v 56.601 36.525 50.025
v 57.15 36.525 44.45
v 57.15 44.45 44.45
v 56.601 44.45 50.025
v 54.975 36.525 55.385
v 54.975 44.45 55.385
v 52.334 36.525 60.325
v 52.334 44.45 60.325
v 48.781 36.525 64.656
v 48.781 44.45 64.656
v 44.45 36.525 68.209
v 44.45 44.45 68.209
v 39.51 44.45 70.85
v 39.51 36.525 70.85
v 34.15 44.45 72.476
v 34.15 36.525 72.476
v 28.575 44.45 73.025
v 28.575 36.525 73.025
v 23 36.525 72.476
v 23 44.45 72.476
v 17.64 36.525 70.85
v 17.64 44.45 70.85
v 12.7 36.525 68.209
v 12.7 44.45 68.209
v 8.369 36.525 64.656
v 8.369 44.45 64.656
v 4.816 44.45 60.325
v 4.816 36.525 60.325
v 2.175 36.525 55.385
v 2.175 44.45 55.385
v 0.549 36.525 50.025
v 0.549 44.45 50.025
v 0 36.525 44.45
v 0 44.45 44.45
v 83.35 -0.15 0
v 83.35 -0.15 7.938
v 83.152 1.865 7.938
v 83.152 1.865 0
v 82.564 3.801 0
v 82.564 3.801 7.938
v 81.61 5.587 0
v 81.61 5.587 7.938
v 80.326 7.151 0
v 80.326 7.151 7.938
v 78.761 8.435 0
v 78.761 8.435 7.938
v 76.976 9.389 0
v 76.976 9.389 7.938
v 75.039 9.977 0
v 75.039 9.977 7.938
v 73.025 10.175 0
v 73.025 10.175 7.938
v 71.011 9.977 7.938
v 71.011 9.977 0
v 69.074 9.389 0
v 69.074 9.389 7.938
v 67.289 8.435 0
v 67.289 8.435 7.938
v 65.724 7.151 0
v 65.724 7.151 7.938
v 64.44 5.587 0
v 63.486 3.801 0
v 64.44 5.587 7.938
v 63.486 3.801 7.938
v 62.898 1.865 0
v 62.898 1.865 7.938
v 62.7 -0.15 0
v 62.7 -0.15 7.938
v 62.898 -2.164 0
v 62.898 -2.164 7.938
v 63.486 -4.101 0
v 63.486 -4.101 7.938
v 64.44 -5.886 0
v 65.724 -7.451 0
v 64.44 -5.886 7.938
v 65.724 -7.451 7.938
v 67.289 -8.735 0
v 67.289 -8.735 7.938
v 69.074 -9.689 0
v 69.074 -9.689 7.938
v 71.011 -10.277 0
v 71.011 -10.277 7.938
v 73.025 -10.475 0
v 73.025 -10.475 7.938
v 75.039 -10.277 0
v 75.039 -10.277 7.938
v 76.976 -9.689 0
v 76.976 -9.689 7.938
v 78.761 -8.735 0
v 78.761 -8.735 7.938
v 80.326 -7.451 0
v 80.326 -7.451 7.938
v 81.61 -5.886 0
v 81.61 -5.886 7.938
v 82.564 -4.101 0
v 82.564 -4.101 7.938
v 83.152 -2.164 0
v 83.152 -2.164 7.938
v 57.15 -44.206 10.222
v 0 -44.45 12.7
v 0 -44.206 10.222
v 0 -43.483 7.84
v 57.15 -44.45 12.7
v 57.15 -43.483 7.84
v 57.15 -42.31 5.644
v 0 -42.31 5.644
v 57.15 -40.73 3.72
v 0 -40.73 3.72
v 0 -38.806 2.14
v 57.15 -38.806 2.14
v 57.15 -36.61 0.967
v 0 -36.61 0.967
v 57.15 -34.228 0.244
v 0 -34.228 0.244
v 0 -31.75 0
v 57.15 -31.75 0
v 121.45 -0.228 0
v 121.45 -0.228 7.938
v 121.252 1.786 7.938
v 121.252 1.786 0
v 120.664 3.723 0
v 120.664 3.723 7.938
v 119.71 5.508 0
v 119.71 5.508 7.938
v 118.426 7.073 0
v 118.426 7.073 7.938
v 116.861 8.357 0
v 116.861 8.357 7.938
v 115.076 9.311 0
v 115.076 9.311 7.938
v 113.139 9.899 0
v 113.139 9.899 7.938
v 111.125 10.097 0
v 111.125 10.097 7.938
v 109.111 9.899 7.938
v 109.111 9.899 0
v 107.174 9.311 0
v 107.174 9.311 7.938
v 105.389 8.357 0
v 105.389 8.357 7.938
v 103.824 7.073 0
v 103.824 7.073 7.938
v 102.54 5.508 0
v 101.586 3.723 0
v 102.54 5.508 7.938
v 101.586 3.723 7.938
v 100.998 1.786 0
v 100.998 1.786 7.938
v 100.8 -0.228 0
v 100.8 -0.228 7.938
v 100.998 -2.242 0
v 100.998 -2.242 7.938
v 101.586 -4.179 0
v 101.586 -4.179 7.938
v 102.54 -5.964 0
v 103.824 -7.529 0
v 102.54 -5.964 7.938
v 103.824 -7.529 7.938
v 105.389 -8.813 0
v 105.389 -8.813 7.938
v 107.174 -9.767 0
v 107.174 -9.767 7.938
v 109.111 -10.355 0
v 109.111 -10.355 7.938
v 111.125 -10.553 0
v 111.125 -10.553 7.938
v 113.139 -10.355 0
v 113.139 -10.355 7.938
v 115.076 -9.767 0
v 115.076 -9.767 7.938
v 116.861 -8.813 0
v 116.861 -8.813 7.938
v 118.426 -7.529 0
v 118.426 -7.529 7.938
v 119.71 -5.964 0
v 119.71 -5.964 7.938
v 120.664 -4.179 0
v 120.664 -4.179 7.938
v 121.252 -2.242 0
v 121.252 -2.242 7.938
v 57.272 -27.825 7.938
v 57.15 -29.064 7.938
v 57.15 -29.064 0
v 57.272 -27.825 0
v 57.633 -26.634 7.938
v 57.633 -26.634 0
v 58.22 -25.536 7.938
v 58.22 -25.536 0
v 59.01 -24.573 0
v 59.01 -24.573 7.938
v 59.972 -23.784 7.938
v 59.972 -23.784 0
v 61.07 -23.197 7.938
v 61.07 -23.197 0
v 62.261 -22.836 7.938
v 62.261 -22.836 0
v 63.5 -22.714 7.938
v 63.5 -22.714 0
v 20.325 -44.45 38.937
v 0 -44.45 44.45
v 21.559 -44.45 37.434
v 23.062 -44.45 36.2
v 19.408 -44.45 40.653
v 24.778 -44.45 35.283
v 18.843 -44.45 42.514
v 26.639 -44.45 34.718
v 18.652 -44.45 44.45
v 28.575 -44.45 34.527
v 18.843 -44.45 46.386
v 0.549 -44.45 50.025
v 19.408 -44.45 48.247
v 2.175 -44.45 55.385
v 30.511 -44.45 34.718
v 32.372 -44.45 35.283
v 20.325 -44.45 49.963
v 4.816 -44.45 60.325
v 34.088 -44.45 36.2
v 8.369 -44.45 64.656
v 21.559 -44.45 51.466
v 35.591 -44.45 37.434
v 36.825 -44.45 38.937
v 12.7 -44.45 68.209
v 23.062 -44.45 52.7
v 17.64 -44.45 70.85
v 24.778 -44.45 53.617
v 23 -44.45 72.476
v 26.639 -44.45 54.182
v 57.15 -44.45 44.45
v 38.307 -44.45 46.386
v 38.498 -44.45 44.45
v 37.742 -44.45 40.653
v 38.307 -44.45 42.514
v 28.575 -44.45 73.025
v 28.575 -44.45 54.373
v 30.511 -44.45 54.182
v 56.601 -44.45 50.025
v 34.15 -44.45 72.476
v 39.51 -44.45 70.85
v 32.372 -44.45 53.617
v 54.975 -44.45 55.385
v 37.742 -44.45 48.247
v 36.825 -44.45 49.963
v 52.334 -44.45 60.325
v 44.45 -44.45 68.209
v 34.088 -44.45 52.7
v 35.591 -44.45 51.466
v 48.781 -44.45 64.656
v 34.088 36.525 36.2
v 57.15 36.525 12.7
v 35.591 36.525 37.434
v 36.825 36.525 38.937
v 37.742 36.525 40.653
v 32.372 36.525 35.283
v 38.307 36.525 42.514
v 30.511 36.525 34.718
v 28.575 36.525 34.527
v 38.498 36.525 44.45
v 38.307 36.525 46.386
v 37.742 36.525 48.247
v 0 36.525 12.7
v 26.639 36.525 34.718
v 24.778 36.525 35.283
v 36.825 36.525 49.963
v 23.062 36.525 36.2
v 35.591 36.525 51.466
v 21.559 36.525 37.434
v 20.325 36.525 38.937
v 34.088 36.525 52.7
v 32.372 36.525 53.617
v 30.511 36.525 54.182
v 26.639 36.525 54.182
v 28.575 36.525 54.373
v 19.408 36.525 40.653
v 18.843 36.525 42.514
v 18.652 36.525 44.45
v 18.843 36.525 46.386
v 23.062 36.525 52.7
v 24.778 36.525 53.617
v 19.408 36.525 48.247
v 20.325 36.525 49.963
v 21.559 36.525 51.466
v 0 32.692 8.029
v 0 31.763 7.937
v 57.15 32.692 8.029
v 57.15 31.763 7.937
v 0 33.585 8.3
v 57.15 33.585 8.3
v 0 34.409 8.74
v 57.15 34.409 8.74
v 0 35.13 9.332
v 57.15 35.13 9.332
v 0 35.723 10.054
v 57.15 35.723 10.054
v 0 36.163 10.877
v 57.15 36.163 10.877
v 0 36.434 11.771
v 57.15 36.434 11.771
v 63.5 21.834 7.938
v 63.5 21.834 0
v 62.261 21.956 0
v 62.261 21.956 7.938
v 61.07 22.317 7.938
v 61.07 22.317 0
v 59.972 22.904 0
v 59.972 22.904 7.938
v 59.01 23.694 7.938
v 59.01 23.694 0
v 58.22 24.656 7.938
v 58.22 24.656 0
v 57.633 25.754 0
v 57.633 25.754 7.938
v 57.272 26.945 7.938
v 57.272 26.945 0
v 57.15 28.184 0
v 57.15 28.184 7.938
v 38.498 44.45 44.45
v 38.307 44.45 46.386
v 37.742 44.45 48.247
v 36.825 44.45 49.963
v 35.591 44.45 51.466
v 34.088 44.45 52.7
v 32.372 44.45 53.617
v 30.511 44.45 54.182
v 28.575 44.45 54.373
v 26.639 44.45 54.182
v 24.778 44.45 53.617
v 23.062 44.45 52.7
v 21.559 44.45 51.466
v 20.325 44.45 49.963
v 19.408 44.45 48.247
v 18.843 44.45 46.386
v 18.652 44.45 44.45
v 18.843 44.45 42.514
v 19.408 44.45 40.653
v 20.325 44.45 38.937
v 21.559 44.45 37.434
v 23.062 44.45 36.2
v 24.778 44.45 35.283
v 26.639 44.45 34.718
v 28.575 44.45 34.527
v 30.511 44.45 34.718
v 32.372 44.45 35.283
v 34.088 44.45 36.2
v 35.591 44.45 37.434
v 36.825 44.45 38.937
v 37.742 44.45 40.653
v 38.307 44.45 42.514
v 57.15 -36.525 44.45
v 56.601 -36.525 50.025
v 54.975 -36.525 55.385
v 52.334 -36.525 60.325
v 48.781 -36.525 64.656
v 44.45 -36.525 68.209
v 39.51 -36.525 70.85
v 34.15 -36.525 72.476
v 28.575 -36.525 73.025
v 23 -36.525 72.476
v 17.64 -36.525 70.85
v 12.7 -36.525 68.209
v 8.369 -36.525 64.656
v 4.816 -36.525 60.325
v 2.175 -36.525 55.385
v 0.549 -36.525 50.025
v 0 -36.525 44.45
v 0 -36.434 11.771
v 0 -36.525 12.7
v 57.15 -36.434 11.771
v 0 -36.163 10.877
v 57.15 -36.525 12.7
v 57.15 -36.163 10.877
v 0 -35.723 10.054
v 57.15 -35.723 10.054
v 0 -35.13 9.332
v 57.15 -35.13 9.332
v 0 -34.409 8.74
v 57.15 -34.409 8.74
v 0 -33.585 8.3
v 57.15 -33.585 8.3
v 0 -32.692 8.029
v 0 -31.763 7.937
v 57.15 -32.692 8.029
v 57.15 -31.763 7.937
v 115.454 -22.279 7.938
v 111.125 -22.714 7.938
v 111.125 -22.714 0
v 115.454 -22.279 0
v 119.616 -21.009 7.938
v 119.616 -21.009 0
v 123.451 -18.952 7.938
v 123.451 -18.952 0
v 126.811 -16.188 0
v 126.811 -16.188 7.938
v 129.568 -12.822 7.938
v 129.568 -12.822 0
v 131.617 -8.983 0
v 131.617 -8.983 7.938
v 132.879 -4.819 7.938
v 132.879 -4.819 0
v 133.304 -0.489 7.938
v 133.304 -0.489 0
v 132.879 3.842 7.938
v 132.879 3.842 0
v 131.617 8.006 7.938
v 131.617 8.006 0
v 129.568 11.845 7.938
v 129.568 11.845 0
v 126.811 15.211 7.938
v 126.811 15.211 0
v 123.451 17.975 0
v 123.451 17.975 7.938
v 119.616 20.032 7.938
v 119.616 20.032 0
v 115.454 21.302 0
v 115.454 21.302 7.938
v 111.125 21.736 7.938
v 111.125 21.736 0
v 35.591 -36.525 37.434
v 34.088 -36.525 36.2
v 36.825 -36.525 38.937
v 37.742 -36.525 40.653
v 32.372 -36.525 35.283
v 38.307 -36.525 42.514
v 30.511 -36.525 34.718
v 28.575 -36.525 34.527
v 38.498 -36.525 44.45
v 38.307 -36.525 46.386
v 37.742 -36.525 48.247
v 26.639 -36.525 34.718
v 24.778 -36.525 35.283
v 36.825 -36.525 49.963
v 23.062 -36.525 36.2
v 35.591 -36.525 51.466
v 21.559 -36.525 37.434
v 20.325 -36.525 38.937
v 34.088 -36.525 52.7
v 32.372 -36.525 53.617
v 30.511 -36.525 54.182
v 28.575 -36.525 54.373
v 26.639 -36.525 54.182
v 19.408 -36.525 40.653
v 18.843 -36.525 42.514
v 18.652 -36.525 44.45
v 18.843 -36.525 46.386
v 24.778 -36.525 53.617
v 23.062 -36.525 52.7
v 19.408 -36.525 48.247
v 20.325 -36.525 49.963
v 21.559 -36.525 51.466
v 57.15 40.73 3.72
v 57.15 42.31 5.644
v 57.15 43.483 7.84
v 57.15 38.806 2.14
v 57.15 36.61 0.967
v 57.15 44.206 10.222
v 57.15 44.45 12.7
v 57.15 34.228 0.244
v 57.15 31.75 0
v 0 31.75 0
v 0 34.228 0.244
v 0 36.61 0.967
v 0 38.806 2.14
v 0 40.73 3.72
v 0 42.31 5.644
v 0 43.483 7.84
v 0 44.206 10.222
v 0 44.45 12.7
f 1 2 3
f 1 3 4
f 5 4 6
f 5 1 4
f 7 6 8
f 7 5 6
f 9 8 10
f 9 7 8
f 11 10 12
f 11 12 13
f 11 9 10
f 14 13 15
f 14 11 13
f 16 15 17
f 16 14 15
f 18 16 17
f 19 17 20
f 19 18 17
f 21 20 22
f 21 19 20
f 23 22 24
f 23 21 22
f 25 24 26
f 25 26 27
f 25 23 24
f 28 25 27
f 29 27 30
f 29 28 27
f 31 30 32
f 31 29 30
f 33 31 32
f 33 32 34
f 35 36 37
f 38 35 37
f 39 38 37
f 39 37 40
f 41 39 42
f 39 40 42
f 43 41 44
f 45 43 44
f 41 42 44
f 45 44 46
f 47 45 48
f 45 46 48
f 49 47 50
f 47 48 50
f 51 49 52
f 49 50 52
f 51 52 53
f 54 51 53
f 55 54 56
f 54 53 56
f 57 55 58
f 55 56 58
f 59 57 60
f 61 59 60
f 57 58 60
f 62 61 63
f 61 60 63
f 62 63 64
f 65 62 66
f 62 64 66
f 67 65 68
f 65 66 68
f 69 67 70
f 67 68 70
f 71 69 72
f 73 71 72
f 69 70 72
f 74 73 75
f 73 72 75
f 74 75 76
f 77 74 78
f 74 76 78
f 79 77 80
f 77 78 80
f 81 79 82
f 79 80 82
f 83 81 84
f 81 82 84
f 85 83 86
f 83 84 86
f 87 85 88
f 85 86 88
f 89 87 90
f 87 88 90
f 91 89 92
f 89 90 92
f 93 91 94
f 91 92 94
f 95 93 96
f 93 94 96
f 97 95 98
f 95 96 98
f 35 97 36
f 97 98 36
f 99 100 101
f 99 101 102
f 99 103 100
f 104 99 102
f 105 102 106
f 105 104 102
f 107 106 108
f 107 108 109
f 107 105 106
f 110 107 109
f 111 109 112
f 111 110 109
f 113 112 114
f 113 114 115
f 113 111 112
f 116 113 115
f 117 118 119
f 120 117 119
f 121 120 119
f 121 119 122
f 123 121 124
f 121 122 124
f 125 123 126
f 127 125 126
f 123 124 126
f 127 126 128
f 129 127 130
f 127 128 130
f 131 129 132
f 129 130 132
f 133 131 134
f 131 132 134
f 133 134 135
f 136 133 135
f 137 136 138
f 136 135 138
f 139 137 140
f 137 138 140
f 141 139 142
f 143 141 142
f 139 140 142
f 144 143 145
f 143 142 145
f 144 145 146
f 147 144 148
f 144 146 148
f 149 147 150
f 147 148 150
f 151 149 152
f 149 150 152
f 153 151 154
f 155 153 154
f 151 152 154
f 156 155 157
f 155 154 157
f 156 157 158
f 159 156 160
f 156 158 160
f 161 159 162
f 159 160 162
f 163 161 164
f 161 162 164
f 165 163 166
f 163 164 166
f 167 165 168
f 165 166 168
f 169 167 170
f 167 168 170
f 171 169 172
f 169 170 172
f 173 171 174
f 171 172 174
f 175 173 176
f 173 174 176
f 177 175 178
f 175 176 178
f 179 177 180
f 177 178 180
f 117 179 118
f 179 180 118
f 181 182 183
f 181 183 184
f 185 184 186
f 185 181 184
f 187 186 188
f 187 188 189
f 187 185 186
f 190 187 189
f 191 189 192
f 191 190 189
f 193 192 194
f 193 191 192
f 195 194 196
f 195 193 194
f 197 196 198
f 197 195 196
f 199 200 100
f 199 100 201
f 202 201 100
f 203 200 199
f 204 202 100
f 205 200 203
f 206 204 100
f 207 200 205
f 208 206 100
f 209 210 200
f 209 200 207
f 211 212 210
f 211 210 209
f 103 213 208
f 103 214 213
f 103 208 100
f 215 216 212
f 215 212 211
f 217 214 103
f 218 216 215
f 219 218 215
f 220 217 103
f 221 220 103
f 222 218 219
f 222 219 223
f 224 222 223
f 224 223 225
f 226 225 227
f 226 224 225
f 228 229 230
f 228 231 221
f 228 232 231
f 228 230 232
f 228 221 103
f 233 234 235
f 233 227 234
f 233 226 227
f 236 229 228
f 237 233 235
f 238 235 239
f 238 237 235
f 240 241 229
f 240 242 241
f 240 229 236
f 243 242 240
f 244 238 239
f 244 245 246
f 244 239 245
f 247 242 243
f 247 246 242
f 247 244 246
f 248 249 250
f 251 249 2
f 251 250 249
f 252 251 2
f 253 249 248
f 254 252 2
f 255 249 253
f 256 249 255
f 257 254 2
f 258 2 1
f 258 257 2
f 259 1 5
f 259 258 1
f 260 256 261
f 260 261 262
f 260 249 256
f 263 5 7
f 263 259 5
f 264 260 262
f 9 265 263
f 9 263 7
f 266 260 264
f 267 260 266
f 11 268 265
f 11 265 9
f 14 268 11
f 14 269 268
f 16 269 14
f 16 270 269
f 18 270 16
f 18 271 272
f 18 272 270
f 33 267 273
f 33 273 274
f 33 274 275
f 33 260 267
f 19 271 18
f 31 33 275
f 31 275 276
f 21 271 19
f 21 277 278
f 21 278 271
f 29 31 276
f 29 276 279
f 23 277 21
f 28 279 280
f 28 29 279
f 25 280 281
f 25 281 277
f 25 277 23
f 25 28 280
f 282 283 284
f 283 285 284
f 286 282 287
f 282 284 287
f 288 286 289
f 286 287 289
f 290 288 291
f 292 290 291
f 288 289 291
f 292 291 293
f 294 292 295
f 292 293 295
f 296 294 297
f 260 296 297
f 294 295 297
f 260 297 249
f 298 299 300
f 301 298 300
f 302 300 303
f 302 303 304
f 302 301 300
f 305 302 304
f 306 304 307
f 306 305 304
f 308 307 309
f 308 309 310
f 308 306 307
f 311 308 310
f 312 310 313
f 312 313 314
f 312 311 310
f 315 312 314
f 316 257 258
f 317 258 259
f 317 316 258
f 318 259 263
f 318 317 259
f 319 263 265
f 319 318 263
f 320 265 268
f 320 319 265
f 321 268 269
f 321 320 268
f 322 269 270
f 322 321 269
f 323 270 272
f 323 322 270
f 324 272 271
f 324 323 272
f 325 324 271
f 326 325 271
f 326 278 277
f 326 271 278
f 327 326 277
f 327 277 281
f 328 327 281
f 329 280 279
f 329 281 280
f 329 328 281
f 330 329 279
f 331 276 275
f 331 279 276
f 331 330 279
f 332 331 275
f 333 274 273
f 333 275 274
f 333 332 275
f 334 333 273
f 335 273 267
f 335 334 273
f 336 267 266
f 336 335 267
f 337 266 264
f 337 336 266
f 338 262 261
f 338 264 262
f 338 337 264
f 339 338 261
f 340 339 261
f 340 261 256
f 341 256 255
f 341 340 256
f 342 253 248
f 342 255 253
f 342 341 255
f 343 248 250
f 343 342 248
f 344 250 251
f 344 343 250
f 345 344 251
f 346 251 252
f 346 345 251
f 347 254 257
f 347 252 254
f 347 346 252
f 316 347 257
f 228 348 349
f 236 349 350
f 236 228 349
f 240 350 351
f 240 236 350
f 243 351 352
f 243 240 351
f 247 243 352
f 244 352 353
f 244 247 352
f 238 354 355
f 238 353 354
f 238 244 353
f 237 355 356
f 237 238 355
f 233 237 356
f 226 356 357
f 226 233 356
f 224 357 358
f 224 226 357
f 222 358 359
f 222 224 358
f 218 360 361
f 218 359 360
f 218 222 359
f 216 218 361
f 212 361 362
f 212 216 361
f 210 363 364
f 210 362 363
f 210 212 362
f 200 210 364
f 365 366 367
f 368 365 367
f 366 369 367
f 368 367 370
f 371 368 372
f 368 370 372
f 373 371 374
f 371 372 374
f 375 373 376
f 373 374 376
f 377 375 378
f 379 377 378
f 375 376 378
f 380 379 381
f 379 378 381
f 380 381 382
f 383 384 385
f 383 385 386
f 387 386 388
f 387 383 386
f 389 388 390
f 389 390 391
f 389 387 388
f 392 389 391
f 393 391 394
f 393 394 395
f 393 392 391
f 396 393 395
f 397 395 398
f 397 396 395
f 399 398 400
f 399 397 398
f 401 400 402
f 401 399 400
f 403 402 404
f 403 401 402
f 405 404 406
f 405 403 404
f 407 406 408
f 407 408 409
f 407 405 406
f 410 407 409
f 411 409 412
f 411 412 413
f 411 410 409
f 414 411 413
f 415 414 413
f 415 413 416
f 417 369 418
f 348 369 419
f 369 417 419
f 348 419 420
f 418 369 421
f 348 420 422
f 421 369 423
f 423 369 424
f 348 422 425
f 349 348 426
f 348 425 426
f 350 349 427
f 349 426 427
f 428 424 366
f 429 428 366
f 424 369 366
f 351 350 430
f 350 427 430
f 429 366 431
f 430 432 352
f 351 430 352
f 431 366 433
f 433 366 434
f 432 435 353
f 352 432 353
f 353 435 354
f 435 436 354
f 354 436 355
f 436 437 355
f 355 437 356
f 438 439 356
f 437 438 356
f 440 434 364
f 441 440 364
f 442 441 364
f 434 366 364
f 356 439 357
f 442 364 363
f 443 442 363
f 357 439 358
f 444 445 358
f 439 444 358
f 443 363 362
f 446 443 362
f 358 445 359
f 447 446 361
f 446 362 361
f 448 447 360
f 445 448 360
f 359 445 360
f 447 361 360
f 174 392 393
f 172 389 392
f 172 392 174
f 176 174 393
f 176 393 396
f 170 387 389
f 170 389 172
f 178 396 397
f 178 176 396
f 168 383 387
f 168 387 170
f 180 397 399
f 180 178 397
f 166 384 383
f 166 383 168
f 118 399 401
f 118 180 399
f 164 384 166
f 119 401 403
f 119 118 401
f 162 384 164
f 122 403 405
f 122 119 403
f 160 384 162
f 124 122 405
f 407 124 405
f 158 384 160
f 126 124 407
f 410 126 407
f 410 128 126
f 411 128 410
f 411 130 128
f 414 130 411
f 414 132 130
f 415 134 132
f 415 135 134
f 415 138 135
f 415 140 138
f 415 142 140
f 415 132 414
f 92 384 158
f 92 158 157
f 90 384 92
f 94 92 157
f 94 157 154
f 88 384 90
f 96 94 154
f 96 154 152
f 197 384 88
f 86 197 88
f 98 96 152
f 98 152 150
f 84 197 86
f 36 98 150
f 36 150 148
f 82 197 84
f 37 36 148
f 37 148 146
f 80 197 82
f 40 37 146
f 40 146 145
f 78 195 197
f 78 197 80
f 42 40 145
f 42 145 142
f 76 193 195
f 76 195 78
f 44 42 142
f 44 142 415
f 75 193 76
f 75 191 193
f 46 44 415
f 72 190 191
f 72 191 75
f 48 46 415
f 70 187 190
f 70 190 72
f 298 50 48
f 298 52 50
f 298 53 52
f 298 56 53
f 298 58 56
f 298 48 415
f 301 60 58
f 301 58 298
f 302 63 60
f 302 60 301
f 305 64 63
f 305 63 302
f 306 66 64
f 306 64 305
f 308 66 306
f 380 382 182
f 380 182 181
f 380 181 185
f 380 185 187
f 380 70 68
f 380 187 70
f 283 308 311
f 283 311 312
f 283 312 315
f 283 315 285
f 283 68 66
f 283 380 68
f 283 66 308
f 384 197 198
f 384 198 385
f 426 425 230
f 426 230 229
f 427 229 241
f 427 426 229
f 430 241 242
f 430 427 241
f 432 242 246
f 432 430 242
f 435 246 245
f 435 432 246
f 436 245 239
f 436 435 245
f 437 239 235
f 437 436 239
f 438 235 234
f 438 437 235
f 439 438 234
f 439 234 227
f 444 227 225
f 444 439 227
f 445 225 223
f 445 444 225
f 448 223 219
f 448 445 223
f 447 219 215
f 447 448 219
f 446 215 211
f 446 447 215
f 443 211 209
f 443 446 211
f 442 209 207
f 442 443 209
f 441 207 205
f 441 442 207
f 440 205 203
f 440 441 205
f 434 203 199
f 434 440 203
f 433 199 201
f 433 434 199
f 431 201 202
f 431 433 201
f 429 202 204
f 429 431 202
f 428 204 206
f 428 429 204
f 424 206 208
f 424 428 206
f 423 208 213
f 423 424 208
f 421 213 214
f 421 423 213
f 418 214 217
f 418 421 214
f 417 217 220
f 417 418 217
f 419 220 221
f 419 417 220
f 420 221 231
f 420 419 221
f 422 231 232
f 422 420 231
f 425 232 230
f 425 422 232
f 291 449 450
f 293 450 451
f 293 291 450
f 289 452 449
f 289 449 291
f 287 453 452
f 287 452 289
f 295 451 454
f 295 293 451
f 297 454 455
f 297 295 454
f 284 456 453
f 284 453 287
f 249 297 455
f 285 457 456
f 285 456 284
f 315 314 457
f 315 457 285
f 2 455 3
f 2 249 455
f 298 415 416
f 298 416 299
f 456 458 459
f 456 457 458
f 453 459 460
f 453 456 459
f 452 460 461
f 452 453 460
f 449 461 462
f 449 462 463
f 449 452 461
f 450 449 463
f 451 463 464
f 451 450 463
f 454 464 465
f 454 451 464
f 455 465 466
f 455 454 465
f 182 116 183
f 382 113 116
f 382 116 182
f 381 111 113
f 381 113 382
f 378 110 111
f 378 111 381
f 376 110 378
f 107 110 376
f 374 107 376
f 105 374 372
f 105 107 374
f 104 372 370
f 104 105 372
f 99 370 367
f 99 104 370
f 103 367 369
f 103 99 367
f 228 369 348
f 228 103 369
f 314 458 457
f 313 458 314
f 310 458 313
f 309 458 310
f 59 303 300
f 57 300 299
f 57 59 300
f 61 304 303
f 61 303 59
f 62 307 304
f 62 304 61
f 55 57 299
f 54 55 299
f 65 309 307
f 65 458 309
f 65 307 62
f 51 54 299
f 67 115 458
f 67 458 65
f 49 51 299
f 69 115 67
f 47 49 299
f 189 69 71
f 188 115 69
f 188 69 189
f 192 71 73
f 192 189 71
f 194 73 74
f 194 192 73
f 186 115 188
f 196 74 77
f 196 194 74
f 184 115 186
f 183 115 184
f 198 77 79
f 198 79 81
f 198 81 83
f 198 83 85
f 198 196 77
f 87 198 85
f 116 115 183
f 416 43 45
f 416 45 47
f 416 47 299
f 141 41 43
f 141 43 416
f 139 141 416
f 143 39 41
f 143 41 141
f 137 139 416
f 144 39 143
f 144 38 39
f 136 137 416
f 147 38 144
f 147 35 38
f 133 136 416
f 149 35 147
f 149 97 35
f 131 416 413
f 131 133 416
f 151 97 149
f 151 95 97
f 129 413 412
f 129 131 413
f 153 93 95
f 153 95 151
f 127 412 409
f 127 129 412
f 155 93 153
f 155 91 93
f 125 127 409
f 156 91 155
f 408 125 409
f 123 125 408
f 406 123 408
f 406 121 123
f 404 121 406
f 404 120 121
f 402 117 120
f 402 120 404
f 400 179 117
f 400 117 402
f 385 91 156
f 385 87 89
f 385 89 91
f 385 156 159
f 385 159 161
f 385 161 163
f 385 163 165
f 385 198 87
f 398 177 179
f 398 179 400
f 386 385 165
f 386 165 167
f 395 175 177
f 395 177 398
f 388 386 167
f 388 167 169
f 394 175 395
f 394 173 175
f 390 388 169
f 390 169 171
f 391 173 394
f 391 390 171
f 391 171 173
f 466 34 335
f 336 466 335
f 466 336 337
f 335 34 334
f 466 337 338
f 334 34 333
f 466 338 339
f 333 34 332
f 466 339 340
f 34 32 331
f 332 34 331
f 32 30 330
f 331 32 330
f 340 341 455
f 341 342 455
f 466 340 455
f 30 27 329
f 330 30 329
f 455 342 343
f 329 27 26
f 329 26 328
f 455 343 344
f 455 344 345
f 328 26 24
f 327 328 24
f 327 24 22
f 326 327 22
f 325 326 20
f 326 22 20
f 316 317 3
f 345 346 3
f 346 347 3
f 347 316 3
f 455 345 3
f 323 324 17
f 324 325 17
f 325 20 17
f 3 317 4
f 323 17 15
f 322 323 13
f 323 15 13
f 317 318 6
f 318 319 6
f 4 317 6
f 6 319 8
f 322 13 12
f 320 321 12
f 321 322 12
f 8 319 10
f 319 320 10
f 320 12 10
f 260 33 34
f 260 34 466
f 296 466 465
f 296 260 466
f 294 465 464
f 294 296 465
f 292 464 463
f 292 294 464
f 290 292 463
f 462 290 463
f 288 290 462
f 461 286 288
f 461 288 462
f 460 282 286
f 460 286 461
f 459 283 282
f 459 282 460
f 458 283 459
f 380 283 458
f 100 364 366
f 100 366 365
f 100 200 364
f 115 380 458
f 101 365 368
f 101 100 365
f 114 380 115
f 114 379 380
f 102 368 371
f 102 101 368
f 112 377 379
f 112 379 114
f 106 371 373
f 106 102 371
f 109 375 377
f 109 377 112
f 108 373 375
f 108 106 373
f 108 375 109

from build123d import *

# Parameters (mm, degrees)
F0_R     = 9.92251
F1_DEPTH = 44.45
F2_W     = 73.0504
F2_H     = 65.0875
F3_DEPTH = 57.151
F4_R     = 10.3251
F5_DEPTH = 7.9375
F6_R     = 12.7
F7_R     = 4.7625


with BuildPart() as f1:
    # F0 (on Front) → F1 (new body, symmetric)
    with BuildSketch(Plane.XZ):
        with BuildLine():
            Line((0, 44.45), (0, 0))
            Line((0, 0), (57.15, 0))
            Line((57.15, 0), (57.15, 44.45))
            ThreePointArc((57.15, 44.45), (28.575, 73.025), (0, 44.45))
        make_face()
        with Locations((28.575, 44.45)):
            Circle(F0_R, mode=Mode.SUBTRACT)
    extrude(amount=F1_DEPTH, both=True)

    # F2 (on Right) → F3 (cut, through all)
    with BuildSketch(Plane.YZ):
        with Locations((0, 40.48125)):
            Rectangle(F2_W, F2_H)
    extrude(amount=F3_DEPTH, mode=Mode.SUBTRACT)

    # F4 (on face) → F5 (join)
    with BuildSketch(Plane.XY.offset(7.9375)):
        with BuildLine():
            ThreePointArc((57.15, -29.063594), (59.009872, -24.573466), (63.5, -22.713594))
            Line((63.5, -22.713594), (111.125, -22.713594))
            ThreePointArc((111.125, -22.713594), (133.304453, -0.488594), (111.125, 21.736406))
            Line((111.125, 21.736406), (63.5, 21.834106))
            ThreePointArc((63.5, 21.834106), (59.009872, 23.693978), (57.15, 28.184106))
            Line((57.15, 28.184106), (57.15, -29.063594))
        make_face()
        with Locations((73.025, -0.149807)):
            Circle(F4_R, mode=Mode.SUBTRACT)
        with Locations((111.125, -0.227967)):
            Circle(F4_R, mode=Mode.SUBTRACT)
    extrude(amount=-F5_DEPTH)

    # F6
    f6_edges = [f1.edges().sort_by_distance(p)[0] for p in [
        (28.575, -44.45, 0),
        (28.575, 44.45, 0),
    ]]
    fillet(f6_edges, radius=F6_R)

    # F7
    f7_edges = [f1.edges().sort_by_distance(p)[0] for p in [
        (28.575, -36.5252, 7.9375),
        (28.575, 36.5252, 7.9375),
    ]]
    fillet(f7_edges, radius=F7_R)


solid = f1.part
